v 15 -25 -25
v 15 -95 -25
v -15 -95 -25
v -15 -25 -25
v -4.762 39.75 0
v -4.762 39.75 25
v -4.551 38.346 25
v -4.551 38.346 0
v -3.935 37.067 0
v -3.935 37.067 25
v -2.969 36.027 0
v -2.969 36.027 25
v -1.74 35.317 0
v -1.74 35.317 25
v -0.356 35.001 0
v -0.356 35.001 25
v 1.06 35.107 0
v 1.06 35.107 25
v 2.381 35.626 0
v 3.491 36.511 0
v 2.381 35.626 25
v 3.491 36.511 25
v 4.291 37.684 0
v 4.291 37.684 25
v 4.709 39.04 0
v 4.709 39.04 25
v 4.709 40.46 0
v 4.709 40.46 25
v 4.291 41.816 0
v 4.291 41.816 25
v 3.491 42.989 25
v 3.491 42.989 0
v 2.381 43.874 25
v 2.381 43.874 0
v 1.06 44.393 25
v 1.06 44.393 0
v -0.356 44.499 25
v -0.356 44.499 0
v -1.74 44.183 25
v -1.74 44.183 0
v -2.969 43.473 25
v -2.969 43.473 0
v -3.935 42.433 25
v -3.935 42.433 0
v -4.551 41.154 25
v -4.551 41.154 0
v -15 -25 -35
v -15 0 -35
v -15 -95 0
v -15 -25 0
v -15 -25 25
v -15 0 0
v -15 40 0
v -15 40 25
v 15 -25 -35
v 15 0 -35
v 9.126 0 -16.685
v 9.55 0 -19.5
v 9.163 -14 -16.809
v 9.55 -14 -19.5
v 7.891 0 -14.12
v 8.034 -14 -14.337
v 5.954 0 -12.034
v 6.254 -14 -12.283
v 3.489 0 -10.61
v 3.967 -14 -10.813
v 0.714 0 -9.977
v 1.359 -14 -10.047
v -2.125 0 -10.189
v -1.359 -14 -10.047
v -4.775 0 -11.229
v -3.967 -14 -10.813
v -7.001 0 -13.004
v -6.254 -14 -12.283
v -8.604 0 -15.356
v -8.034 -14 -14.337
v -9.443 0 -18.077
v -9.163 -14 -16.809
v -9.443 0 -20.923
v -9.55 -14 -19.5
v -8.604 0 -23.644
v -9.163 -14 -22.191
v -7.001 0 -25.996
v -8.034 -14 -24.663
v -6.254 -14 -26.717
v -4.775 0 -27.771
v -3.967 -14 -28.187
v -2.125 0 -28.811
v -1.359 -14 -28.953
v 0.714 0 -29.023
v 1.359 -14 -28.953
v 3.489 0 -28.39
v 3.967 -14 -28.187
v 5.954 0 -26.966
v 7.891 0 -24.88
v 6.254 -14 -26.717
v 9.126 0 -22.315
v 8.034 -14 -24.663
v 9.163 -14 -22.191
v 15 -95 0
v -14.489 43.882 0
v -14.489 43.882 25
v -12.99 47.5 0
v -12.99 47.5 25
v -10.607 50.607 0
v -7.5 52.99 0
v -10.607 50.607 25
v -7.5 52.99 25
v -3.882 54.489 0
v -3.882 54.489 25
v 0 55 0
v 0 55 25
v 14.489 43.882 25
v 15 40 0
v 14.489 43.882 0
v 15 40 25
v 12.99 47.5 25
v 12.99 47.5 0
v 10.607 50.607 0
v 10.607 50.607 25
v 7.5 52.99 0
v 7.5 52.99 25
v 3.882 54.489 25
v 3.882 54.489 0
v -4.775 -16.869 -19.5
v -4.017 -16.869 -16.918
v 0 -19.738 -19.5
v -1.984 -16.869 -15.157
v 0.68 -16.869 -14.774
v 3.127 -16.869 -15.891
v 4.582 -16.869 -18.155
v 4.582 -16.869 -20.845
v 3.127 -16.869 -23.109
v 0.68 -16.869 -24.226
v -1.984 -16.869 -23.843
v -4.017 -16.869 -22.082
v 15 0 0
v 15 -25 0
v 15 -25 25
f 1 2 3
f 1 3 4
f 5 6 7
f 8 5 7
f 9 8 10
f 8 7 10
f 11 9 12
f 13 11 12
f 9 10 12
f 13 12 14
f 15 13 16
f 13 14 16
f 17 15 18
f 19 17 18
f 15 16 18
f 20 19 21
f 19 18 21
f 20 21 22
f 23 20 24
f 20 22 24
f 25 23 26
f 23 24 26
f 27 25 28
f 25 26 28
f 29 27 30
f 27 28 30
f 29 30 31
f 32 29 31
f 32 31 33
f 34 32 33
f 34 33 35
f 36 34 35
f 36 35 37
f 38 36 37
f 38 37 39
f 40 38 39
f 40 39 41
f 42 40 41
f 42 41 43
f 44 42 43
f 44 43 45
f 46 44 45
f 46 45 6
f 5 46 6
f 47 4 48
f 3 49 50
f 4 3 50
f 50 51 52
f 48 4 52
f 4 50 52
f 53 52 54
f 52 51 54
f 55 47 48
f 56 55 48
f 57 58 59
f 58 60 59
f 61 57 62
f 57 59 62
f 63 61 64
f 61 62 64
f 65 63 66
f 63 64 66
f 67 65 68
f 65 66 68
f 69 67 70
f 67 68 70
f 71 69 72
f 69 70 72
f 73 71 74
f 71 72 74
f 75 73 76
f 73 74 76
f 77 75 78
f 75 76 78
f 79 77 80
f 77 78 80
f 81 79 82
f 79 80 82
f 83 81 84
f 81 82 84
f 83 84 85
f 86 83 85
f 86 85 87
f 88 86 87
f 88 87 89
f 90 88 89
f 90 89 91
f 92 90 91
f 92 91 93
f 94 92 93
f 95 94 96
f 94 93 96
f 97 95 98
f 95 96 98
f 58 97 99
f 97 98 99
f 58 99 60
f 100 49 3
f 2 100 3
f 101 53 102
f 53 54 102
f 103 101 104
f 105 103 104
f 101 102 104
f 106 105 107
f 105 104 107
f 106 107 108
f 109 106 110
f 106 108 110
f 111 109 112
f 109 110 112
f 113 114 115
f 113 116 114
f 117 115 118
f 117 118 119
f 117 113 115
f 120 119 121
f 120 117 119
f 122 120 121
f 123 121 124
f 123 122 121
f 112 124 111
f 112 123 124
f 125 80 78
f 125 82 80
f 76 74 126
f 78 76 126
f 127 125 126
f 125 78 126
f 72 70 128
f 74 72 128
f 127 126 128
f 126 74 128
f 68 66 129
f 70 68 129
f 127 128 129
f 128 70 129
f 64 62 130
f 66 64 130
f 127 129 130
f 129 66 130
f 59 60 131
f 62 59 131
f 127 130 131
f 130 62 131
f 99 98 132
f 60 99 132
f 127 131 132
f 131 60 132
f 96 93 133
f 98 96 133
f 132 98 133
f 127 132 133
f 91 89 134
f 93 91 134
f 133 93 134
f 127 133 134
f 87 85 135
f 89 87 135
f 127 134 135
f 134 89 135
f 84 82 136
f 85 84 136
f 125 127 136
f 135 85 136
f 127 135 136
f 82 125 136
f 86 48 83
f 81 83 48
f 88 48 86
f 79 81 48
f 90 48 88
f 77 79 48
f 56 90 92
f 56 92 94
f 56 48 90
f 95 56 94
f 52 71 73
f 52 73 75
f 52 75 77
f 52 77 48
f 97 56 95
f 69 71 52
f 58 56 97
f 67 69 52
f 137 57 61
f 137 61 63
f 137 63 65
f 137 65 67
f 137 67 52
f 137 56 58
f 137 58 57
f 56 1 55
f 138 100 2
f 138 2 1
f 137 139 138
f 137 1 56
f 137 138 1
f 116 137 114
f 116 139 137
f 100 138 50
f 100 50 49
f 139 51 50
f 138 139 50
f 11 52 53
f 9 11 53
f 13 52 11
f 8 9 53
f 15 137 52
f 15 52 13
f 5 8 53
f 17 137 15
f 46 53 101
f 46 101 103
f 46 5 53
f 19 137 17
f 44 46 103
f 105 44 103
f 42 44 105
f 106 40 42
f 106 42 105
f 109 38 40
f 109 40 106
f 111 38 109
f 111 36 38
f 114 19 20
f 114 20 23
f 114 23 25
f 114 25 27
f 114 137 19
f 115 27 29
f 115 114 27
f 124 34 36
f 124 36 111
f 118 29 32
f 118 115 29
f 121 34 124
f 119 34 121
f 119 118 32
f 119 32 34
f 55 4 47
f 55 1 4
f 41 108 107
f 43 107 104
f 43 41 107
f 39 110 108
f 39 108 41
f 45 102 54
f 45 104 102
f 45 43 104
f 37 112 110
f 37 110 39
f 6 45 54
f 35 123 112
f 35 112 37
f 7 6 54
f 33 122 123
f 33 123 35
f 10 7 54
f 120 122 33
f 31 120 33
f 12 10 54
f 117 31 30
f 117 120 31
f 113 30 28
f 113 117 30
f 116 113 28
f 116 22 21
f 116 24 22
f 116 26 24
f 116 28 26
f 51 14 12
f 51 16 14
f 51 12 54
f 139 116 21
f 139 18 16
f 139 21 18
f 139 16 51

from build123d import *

# Parameters (mm, degrees)
F1_DEPTH = 15
F3_D     = 19.1
F3_DEPTH = 14
F3_TIP   = 5.7382189117
F5_R     = 14.99999
F6_D     = 9.525


# Not quite as in the source:
# - a fillet or chamfer is up to 0.001 mm smaller than in the source, because OpenCascade refuses the exact size
# - a length typed as a fraction of an inch, garbled in the dataset ("3 / 203.2 mm" for 3/8 in), is restored


with BuildPart() as f1:
    # F0 (on Right) → F1 (new body, symmetric)
    with BuildSketch(Plane.YZ):
        Polygon((0, -35), (0, 0), (55, 0), (55, 25), (-25, 25), (-25, 0), (-95, 0), (-95, -25), (-25, -25), (-25, -35), align=None)
    extrude(amount=F1_DEPTH, both=True)

    # F3
    with Locations(Plane(origin=(0, 0, 0), x_dir=(-1, 0, 0), z_dir=(0, 1, 0))):
        with Locations((0, -19.5)):
            Hole(F3_D / 2, depth=F3_DEPTH)
            with Locations((0, 0, -(F3_DEPTH + F3_TIP / 2))):  # 118° drill point
                Cone(0, F3_D / 2, F3_TIP, mode=Mode.SUBTRACT)

    # F5 (radius 15 in the source; OpenCascade refuses exactly that, so slightly less here)
    f5_edges = [f1.edges().sort_by_distance(p)[0] for p in [
        (-15, 55, 12.5),
        (15, 55, 12.5),
    ]]
    fillet(f5_edges, radius=F5_R)

    # F6 (through all)
    with Locations(Plane(origin=(0, 0, 0), x_dir=(1, 0, 0), z_dir=(0, 0, -1))):
        with Locations((0, -39.75)):
            Hole(F6_D / 2)


solid = f1.part
